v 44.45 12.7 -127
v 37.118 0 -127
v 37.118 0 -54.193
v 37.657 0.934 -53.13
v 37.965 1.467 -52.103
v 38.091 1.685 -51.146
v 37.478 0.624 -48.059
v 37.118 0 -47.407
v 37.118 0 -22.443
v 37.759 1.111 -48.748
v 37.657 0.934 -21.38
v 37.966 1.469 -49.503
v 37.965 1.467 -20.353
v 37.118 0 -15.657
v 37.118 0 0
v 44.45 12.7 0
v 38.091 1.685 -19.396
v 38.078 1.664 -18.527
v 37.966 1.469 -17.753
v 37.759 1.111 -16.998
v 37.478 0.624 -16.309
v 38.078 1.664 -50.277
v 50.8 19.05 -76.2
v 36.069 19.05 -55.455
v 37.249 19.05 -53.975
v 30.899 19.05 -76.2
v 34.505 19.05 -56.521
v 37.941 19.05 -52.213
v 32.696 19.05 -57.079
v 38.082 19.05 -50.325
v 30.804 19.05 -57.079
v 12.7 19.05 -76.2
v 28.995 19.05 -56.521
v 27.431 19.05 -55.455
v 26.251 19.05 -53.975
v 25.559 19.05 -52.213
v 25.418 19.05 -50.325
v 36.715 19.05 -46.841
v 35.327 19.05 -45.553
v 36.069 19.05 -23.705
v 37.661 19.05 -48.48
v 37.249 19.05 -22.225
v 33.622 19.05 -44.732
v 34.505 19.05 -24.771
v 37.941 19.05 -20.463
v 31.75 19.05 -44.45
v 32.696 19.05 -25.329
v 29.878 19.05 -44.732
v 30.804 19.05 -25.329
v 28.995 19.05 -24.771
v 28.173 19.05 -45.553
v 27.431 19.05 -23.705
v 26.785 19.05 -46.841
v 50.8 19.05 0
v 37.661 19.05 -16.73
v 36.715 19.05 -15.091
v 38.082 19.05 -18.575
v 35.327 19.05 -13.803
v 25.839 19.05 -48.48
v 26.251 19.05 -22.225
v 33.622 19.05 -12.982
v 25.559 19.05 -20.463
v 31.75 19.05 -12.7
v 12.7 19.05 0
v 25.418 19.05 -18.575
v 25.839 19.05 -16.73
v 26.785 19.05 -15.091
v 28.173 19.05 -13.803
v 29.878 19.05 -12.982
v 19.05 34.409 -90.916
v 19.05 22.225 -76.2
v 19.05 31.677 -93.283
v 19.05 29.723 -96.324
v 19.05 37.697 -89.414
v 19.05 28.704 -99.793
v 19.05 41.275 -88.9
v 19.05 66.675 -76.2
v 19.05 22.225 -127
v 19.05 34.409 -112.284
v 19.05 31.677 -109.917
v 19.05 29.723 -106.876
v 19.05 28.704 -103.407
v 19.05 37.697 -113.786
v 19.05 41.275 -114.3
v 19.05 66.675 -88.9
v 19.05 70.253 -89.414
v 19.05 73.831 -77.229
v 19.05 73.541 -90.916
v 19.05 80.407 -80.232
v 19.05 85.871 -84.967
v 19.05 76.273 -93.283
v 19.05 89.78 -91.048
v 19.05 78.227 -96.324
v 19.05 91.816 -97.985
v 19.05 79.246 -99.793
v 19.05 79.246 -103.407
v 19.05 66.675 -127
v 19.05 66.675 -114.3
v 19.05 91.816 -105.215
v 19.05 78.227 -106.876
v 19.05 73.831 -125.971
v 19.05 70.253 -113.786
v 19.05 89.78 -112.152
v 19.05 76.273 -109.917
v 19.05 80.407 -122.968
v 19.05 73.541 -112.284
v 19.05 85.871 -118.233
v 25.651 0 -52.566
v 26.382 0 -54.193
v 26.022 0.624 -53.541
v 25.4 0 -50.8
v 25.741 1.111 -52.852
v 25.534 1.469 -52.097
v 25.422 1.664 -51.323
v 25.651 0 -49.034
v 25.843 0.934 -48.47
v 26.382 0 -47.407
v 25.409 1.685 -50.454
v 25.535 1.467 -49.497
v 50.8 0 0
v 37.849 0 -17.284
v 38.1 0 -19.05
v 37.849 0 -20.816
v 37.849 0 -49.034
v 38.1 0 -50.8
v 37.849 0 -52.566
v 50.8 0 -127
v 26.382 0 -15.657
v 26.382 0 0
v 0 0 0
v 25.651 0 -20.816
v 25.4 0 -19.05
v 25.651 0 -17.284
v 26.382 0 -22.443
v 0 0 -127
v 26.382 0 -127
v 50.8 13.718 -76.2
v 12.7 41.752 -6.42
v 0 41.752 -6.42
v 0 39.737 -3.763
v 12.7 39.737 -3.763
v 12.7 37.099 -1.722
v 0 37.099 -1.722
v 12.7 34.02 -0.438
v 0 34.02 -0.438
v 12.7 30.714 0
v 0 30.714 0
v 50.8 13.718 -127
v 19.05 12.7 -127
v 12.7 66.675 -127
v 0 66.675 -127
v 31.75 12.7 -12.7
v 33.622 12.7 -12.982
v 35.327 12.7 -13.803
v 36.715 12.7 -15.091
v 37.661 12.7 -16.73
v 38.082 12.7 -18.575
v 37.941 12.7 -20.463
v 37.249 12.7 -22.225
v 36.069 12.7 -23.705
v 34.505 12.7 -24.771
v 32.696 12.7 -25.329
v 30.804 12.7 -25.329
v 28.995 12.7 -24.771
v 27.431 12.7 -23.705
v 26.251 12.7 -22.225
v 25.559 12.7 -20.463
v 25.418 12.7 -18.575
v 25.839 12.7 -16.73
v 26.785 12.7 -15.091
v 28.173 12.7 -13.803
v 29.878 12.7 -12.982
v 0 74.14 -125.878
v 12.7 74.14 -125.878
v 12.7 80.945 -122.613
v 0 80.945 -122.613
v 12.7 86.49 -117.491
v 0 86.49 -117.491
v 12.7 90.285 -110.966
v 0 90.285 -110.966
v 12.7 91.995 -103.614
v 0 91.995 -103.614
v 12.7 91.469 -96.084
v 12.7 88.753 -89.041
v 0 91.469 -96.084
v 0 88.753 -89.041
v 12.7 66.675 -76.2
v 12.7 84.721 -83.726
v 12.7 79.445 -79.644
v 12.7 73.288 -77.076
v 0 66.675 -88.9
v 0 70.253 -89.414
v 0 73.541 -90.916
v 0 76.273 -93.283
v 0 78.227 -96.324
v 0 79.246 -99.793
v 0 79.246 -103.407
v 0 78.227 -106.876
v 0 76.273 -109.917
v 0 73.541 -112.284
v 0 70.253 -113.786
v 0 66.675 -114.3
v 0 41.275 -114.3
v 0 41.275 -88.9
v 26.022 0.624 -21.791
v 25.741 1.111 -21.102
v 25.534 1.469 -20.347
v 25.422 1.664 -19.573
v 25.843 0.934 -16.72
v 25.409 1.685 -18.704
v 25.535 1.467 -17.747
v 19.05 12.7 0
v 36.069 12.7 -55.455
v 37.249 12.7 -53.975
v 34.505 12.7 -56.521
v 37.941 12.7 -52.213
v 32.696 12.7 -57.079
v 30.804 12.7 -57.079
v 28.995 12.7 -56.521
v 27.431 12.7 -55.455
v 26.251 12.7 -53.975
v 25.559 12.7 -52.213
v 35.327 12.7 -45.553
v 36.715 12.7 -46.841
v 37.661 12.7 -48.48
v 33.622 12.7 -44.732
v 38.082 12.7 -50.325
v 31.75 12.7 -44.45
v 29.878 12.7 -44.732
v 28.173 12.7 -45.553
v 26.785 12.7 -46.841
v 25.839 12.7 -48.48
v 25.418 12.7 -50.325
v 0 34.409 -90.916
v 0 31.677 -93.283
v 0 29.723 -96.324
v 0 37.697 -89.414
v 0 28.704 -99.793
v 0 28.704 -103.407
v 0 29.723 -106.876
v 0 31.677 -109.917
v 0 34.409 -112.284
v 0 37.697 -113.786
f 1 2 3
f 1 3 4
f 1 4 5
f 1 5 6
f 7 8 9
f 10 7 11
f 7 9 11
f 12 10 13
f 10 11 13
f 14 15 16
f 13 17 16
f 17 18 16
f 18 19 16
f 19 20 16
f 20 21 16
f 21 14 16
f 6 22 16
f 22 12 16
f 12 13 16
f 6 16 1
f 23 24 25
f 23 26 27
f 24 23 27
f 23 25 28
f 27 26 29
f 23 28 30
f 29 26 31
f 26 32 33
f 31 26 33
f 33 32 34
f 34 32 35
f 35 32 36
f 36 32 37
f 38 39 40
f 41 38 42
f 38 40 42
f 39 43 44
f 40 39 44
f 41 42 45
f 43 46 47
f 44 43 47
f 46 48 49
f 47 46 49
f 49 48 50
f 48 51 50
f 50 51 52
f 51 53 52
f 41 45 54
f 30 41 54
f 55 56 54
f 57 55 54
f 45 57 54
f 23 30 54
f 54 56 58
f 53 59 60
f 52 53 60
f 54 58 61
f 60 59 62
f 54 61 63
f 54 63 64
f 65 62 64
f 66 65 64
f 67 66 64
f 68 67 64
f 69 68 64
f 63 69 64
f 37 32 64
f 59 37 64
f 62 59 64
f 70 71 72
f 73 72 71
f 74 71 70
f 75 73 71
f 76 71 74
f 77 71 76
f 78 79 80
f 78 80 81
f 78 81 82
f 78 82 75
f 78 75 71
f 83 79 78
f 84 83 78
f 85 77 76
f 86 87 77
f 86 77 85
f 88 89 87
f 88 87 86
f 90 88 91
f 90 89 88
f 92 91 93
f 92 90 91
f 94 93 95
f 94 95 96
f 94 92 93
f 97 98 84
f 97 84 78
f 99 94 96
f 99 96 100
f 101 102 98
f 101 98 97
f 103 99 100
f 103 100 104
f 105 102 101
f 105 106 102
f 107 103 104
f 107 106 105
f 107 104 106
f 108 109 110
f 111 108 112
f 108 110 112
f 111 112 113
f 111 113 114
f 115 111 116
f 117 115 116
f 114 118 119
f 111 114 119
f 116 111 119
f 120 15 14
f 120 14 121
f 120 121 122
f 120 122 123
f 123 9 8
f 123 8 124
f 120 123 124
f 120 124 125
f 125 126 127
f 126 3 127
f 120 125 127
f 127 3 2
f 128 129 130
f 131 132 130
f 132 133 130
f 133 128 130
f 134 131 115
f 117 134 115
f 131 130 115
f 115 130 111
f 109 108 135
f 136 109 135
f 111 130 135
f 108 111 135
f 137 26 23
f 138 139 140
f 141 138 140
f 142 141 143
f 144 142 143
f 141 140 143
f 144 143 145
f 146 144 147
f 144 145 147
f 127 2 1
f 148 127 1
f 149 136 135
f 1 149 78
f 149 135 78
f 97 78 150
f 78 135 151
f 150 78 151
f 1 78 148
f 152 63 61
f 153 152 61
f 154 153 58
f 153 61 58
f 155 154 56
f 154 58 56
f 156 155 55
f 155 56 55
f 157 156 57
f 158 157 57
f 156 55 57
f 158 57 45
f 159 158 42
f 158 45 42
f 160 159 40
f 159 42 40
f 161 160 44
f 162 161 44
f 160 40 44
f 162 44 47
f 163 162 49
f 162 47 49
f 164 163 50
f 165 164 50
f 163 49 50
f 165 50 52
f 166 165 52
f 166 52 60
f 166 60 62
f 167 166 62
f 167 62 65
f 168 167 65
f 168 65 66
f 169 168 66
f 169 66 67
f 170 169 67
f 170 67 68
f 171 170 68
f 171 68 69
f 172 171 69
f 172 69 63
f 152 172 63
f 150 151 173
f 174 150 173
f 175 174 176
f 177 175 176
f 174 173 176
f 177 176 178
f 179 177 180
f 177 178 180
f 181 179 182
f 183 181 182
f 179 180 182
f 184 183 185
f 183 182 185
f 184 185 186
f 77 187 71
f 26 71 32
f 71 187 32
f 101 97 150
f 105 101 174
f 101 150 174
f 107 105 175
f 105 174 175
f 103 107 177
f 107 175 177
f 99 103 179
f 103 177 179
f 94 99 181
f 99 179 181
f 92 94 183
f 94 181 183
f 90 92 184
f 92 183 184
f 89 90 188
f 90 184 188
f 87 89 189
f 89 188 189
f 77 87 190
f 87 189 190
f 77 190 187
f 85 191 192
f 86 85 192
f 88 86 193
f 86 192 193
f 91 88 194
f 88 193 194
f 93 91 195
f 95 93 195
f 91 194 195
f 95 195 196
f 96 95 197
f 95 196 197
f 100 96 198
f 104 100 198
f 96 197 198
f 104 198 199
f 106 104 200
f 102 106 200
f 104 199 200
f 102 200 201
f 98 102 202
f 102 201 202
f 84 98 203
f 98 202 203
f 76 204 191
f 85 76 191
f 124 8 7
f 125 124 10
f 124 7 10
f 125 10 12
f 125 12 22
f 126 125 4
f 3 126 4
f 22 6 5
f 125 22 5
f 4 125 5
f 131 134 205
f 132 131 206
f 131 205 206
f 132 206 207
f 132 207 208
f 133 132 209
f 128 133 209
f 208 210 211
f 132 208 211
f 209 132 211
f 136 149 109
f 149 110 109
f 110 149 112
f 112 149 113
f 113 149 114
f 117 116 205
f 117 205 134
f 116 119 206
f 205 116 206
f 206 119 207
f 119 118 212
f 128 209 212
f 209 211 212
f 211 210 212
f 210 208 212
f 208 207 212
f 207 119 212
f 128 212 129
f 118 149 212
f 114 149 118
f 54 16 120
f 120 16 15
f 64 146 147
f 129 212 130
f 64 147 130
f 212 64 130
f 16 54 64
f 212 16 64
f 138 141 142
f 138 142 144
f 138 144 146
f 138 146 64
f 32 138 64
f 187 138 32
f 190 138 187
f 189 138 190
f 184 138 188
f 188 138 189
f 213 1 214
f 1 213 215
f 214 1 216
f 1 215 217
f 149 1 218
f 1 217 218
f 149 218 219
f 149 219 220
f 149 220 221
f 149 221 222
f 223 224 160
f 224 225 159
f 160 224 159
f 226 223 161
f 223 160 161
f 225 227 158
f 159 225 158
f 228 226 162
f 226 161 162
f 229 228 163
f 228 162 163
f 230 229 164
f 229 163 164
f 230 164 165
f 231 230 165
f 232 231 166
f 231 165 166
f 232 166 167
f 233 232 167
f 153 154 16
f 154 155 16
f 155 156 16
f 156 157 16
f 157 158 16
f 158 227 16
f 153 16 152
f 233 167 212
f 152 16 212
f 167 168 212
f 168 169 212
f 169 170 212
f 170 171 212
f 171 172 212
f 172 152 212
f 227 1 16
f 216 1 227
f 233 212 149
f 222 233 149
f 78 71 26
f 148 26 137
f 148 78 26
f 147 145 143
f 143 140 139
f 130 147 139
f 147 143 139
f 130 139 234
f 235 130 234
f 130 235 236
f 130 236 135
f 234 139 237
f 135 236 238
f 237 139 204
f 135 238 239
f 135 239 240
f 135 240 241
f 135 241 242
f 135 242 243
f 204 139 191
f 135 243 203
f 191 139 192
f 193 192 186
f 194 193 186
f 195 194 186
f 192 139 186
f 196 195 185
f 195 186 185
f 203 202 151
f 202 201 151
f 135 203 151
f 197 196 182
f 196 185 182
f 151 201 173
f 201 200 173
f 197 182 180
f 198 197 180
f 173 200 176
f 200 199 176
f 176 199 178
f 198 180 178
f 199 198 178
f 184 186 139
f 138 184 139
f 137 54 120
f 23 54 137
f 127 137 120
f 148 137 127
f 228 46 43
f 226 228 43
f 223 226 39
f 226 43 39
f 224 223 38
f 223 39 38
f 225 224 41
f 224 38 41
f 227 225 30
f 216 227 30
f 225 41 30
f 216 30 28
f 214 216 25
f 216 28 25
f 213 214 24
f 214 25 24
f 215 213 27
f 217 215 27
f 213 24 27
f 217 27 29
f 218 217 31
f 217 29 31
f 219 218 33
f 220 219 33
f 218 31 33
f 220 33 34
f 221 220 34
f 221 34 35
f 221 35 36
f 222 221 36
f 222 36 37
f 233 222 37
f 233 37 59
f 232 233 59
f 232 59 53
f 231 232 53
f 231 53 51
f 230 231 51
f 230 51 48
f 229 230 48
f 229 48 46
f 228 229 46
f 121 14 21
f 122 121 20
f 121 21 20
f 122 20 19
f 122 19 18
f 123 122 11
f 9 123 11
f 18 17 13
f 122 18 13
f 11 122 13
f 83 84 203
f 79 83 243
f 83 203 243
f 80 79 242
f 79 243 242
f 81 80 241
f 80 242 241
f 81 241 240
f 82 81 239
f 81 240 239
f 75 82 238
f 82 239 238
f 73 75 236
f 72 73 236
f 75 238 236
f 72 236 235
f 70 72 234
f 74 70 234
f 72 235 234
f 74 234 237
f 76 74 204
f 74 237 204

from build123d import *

# Parameters (mm, degrees)
BOSS_EXTRUDE1_DEPTH = 12.7
BOSS_EXTRUDE2_DEPTH = 50.8
BOSS_EXTRUDE3_DEPTH = 19.05
CUT_EXTRUDE1_DEPTH  = 165.886159592
SKETCH4_R           = 6.35
CUT_EXTRUDE2_DEPTH  = 156.055766178
CUT_EXTRUDE3_DEPTH  = 50.8


with BuildPart() as part:
    # Sketch1 → Boss-Extrude1 (new body)
    with BuildSketch(Plane(origin=(0, 0, 0), x_dir=(0, 0, -1), z_dir=(1, 0, 0))):
        with BuildLine():
            Line((0, 0), (127, 0))
            Line((127, 0), (127, 66.675))
            ThreePointArc((127, 66.675), (114.370135783, 88.631402986), (89.04065889, 88.752657278))
            Line((89.04065889, 88.752657278), (6.420329445, 41.752339853))
            ThreePointArc((6.420329445, 41.752339853), (1.721798507, 37.098579105), (0, 30.713511214))
            Line((0, 30.713511214), (0, 0))
        make_face()
        with BuildLine():
            Line((88.9, 41.275), (88.9, 66.675))
            ThreePointArc((88.9, 66.675), (101.6, 79.375), (114.3, 66.675))
            Line((114.3, 66.675), (114.3, 41.275))
            ThreePointArc((114.3, 41.275), (101.6, 28.575), (88.9, 41.275))
        make_face(mode=Mode.SUBTRACT)
    extrude(amount=BOSS_EXTRUDE1_DEPTH)

    # Sketch1<3> → Boss-Extrude2 (add)
    with BuildSketch(Plane(origin=(0, 0, 0), x_dir=(0, 0, -1), z_dir=(1, 0, 0))):
        Polygon((0, 19.05), (0, 0), (127, 0), (127, 22.225), (76.2, 22.225), (76.2, 19.05), align=None)
    extrude(amount=BOSS_EXTRUDE2_DEPTH)

    # Sketch1<7> → Boss-Extrude3 (add)
    with BuildSketch(Plane(origin=(0, 0, 0), x_dir=(0, 0, -1), z_dir=(1, 0, 0))):
        with BuildLine():
            Line((76.2, 22.225), (127, 22.225))
            Line((127, 22.225), (127, 66.675))
            ThreePointArc((127, 66.675), (114.370135783, 88.631402986), (89.04065889, 88.752657278))
            ThreePointArc((89.04065889, 88.752657278), (79.643597014, 79.445135783), (76.2, 66.675))
            Line((76.2, 66.675), (76.2, 22.225))
        make_face()
        with BuildLine():
            ThreePointArc((114.3, 41.275), (101.6, 28.575), (88.9, 41.275))
            Line((88.9, 41.275), (88.9, 66.675))
            ThreePointArc((88.9, 66.675), (101.6, 79.375), (114.3, 66.675))
            Line((114.3, 66.675), (114.3, 41.275))
        make_face(mode=Mode.SUBTRACT)
    extrude(amount=BOSS_EXTRUDE3_DEPTH)

    # Sketch3 → Cut-Extrude1 (cut, through all)
    with BuildSketch(Plane.XY):
        Polygon((-67.157348715, -180.609598473), (37.117651581, 0), (44.45, 12.7), (19.05, 12.7), (26.382348419, 0), (130.657348715, -180.609598473), (130.657348715, 236.490402714), (-67.157348715, 236.490402714), align=None)
    extrude(amount=-CUT_EXTRUDE1_DEPTH, mode=Mode.SUBTRACT)

    # Sketch4 → Cut-Extrude2 (cut, through all)
    with BuildSketch(Plane(origin=(0, 19.05, 0), x_dir=(1, 0, 0), z_dir=(0, 1, 0))):
        with Locations((31.75, 19.05)):
            Circle(SKETCH4_R)
        with Locations((31.75, 50.8)):
            Circle(SKETCH4_R)
    extrude(amount=-CUT_EXTRUDE2_DEPTH, mode=Mode.SUBTRACT)

    # Sketch5 → Cut-Extrude3 (cut)
    with BuildSketch(Plane(origin=(0, 0, -127), x_dir=(-1, 0, 0), z_dir=(0, 0, -1))):
        Polygon((-19.05, 22.225), (-50.8, 13.71761314), (-50.8, 22.225), align=None)
    extrude(amount=-CUT_EXTRUDE3_DEPTH, mode=Mode.SUBTRACT)


solid = part.part
